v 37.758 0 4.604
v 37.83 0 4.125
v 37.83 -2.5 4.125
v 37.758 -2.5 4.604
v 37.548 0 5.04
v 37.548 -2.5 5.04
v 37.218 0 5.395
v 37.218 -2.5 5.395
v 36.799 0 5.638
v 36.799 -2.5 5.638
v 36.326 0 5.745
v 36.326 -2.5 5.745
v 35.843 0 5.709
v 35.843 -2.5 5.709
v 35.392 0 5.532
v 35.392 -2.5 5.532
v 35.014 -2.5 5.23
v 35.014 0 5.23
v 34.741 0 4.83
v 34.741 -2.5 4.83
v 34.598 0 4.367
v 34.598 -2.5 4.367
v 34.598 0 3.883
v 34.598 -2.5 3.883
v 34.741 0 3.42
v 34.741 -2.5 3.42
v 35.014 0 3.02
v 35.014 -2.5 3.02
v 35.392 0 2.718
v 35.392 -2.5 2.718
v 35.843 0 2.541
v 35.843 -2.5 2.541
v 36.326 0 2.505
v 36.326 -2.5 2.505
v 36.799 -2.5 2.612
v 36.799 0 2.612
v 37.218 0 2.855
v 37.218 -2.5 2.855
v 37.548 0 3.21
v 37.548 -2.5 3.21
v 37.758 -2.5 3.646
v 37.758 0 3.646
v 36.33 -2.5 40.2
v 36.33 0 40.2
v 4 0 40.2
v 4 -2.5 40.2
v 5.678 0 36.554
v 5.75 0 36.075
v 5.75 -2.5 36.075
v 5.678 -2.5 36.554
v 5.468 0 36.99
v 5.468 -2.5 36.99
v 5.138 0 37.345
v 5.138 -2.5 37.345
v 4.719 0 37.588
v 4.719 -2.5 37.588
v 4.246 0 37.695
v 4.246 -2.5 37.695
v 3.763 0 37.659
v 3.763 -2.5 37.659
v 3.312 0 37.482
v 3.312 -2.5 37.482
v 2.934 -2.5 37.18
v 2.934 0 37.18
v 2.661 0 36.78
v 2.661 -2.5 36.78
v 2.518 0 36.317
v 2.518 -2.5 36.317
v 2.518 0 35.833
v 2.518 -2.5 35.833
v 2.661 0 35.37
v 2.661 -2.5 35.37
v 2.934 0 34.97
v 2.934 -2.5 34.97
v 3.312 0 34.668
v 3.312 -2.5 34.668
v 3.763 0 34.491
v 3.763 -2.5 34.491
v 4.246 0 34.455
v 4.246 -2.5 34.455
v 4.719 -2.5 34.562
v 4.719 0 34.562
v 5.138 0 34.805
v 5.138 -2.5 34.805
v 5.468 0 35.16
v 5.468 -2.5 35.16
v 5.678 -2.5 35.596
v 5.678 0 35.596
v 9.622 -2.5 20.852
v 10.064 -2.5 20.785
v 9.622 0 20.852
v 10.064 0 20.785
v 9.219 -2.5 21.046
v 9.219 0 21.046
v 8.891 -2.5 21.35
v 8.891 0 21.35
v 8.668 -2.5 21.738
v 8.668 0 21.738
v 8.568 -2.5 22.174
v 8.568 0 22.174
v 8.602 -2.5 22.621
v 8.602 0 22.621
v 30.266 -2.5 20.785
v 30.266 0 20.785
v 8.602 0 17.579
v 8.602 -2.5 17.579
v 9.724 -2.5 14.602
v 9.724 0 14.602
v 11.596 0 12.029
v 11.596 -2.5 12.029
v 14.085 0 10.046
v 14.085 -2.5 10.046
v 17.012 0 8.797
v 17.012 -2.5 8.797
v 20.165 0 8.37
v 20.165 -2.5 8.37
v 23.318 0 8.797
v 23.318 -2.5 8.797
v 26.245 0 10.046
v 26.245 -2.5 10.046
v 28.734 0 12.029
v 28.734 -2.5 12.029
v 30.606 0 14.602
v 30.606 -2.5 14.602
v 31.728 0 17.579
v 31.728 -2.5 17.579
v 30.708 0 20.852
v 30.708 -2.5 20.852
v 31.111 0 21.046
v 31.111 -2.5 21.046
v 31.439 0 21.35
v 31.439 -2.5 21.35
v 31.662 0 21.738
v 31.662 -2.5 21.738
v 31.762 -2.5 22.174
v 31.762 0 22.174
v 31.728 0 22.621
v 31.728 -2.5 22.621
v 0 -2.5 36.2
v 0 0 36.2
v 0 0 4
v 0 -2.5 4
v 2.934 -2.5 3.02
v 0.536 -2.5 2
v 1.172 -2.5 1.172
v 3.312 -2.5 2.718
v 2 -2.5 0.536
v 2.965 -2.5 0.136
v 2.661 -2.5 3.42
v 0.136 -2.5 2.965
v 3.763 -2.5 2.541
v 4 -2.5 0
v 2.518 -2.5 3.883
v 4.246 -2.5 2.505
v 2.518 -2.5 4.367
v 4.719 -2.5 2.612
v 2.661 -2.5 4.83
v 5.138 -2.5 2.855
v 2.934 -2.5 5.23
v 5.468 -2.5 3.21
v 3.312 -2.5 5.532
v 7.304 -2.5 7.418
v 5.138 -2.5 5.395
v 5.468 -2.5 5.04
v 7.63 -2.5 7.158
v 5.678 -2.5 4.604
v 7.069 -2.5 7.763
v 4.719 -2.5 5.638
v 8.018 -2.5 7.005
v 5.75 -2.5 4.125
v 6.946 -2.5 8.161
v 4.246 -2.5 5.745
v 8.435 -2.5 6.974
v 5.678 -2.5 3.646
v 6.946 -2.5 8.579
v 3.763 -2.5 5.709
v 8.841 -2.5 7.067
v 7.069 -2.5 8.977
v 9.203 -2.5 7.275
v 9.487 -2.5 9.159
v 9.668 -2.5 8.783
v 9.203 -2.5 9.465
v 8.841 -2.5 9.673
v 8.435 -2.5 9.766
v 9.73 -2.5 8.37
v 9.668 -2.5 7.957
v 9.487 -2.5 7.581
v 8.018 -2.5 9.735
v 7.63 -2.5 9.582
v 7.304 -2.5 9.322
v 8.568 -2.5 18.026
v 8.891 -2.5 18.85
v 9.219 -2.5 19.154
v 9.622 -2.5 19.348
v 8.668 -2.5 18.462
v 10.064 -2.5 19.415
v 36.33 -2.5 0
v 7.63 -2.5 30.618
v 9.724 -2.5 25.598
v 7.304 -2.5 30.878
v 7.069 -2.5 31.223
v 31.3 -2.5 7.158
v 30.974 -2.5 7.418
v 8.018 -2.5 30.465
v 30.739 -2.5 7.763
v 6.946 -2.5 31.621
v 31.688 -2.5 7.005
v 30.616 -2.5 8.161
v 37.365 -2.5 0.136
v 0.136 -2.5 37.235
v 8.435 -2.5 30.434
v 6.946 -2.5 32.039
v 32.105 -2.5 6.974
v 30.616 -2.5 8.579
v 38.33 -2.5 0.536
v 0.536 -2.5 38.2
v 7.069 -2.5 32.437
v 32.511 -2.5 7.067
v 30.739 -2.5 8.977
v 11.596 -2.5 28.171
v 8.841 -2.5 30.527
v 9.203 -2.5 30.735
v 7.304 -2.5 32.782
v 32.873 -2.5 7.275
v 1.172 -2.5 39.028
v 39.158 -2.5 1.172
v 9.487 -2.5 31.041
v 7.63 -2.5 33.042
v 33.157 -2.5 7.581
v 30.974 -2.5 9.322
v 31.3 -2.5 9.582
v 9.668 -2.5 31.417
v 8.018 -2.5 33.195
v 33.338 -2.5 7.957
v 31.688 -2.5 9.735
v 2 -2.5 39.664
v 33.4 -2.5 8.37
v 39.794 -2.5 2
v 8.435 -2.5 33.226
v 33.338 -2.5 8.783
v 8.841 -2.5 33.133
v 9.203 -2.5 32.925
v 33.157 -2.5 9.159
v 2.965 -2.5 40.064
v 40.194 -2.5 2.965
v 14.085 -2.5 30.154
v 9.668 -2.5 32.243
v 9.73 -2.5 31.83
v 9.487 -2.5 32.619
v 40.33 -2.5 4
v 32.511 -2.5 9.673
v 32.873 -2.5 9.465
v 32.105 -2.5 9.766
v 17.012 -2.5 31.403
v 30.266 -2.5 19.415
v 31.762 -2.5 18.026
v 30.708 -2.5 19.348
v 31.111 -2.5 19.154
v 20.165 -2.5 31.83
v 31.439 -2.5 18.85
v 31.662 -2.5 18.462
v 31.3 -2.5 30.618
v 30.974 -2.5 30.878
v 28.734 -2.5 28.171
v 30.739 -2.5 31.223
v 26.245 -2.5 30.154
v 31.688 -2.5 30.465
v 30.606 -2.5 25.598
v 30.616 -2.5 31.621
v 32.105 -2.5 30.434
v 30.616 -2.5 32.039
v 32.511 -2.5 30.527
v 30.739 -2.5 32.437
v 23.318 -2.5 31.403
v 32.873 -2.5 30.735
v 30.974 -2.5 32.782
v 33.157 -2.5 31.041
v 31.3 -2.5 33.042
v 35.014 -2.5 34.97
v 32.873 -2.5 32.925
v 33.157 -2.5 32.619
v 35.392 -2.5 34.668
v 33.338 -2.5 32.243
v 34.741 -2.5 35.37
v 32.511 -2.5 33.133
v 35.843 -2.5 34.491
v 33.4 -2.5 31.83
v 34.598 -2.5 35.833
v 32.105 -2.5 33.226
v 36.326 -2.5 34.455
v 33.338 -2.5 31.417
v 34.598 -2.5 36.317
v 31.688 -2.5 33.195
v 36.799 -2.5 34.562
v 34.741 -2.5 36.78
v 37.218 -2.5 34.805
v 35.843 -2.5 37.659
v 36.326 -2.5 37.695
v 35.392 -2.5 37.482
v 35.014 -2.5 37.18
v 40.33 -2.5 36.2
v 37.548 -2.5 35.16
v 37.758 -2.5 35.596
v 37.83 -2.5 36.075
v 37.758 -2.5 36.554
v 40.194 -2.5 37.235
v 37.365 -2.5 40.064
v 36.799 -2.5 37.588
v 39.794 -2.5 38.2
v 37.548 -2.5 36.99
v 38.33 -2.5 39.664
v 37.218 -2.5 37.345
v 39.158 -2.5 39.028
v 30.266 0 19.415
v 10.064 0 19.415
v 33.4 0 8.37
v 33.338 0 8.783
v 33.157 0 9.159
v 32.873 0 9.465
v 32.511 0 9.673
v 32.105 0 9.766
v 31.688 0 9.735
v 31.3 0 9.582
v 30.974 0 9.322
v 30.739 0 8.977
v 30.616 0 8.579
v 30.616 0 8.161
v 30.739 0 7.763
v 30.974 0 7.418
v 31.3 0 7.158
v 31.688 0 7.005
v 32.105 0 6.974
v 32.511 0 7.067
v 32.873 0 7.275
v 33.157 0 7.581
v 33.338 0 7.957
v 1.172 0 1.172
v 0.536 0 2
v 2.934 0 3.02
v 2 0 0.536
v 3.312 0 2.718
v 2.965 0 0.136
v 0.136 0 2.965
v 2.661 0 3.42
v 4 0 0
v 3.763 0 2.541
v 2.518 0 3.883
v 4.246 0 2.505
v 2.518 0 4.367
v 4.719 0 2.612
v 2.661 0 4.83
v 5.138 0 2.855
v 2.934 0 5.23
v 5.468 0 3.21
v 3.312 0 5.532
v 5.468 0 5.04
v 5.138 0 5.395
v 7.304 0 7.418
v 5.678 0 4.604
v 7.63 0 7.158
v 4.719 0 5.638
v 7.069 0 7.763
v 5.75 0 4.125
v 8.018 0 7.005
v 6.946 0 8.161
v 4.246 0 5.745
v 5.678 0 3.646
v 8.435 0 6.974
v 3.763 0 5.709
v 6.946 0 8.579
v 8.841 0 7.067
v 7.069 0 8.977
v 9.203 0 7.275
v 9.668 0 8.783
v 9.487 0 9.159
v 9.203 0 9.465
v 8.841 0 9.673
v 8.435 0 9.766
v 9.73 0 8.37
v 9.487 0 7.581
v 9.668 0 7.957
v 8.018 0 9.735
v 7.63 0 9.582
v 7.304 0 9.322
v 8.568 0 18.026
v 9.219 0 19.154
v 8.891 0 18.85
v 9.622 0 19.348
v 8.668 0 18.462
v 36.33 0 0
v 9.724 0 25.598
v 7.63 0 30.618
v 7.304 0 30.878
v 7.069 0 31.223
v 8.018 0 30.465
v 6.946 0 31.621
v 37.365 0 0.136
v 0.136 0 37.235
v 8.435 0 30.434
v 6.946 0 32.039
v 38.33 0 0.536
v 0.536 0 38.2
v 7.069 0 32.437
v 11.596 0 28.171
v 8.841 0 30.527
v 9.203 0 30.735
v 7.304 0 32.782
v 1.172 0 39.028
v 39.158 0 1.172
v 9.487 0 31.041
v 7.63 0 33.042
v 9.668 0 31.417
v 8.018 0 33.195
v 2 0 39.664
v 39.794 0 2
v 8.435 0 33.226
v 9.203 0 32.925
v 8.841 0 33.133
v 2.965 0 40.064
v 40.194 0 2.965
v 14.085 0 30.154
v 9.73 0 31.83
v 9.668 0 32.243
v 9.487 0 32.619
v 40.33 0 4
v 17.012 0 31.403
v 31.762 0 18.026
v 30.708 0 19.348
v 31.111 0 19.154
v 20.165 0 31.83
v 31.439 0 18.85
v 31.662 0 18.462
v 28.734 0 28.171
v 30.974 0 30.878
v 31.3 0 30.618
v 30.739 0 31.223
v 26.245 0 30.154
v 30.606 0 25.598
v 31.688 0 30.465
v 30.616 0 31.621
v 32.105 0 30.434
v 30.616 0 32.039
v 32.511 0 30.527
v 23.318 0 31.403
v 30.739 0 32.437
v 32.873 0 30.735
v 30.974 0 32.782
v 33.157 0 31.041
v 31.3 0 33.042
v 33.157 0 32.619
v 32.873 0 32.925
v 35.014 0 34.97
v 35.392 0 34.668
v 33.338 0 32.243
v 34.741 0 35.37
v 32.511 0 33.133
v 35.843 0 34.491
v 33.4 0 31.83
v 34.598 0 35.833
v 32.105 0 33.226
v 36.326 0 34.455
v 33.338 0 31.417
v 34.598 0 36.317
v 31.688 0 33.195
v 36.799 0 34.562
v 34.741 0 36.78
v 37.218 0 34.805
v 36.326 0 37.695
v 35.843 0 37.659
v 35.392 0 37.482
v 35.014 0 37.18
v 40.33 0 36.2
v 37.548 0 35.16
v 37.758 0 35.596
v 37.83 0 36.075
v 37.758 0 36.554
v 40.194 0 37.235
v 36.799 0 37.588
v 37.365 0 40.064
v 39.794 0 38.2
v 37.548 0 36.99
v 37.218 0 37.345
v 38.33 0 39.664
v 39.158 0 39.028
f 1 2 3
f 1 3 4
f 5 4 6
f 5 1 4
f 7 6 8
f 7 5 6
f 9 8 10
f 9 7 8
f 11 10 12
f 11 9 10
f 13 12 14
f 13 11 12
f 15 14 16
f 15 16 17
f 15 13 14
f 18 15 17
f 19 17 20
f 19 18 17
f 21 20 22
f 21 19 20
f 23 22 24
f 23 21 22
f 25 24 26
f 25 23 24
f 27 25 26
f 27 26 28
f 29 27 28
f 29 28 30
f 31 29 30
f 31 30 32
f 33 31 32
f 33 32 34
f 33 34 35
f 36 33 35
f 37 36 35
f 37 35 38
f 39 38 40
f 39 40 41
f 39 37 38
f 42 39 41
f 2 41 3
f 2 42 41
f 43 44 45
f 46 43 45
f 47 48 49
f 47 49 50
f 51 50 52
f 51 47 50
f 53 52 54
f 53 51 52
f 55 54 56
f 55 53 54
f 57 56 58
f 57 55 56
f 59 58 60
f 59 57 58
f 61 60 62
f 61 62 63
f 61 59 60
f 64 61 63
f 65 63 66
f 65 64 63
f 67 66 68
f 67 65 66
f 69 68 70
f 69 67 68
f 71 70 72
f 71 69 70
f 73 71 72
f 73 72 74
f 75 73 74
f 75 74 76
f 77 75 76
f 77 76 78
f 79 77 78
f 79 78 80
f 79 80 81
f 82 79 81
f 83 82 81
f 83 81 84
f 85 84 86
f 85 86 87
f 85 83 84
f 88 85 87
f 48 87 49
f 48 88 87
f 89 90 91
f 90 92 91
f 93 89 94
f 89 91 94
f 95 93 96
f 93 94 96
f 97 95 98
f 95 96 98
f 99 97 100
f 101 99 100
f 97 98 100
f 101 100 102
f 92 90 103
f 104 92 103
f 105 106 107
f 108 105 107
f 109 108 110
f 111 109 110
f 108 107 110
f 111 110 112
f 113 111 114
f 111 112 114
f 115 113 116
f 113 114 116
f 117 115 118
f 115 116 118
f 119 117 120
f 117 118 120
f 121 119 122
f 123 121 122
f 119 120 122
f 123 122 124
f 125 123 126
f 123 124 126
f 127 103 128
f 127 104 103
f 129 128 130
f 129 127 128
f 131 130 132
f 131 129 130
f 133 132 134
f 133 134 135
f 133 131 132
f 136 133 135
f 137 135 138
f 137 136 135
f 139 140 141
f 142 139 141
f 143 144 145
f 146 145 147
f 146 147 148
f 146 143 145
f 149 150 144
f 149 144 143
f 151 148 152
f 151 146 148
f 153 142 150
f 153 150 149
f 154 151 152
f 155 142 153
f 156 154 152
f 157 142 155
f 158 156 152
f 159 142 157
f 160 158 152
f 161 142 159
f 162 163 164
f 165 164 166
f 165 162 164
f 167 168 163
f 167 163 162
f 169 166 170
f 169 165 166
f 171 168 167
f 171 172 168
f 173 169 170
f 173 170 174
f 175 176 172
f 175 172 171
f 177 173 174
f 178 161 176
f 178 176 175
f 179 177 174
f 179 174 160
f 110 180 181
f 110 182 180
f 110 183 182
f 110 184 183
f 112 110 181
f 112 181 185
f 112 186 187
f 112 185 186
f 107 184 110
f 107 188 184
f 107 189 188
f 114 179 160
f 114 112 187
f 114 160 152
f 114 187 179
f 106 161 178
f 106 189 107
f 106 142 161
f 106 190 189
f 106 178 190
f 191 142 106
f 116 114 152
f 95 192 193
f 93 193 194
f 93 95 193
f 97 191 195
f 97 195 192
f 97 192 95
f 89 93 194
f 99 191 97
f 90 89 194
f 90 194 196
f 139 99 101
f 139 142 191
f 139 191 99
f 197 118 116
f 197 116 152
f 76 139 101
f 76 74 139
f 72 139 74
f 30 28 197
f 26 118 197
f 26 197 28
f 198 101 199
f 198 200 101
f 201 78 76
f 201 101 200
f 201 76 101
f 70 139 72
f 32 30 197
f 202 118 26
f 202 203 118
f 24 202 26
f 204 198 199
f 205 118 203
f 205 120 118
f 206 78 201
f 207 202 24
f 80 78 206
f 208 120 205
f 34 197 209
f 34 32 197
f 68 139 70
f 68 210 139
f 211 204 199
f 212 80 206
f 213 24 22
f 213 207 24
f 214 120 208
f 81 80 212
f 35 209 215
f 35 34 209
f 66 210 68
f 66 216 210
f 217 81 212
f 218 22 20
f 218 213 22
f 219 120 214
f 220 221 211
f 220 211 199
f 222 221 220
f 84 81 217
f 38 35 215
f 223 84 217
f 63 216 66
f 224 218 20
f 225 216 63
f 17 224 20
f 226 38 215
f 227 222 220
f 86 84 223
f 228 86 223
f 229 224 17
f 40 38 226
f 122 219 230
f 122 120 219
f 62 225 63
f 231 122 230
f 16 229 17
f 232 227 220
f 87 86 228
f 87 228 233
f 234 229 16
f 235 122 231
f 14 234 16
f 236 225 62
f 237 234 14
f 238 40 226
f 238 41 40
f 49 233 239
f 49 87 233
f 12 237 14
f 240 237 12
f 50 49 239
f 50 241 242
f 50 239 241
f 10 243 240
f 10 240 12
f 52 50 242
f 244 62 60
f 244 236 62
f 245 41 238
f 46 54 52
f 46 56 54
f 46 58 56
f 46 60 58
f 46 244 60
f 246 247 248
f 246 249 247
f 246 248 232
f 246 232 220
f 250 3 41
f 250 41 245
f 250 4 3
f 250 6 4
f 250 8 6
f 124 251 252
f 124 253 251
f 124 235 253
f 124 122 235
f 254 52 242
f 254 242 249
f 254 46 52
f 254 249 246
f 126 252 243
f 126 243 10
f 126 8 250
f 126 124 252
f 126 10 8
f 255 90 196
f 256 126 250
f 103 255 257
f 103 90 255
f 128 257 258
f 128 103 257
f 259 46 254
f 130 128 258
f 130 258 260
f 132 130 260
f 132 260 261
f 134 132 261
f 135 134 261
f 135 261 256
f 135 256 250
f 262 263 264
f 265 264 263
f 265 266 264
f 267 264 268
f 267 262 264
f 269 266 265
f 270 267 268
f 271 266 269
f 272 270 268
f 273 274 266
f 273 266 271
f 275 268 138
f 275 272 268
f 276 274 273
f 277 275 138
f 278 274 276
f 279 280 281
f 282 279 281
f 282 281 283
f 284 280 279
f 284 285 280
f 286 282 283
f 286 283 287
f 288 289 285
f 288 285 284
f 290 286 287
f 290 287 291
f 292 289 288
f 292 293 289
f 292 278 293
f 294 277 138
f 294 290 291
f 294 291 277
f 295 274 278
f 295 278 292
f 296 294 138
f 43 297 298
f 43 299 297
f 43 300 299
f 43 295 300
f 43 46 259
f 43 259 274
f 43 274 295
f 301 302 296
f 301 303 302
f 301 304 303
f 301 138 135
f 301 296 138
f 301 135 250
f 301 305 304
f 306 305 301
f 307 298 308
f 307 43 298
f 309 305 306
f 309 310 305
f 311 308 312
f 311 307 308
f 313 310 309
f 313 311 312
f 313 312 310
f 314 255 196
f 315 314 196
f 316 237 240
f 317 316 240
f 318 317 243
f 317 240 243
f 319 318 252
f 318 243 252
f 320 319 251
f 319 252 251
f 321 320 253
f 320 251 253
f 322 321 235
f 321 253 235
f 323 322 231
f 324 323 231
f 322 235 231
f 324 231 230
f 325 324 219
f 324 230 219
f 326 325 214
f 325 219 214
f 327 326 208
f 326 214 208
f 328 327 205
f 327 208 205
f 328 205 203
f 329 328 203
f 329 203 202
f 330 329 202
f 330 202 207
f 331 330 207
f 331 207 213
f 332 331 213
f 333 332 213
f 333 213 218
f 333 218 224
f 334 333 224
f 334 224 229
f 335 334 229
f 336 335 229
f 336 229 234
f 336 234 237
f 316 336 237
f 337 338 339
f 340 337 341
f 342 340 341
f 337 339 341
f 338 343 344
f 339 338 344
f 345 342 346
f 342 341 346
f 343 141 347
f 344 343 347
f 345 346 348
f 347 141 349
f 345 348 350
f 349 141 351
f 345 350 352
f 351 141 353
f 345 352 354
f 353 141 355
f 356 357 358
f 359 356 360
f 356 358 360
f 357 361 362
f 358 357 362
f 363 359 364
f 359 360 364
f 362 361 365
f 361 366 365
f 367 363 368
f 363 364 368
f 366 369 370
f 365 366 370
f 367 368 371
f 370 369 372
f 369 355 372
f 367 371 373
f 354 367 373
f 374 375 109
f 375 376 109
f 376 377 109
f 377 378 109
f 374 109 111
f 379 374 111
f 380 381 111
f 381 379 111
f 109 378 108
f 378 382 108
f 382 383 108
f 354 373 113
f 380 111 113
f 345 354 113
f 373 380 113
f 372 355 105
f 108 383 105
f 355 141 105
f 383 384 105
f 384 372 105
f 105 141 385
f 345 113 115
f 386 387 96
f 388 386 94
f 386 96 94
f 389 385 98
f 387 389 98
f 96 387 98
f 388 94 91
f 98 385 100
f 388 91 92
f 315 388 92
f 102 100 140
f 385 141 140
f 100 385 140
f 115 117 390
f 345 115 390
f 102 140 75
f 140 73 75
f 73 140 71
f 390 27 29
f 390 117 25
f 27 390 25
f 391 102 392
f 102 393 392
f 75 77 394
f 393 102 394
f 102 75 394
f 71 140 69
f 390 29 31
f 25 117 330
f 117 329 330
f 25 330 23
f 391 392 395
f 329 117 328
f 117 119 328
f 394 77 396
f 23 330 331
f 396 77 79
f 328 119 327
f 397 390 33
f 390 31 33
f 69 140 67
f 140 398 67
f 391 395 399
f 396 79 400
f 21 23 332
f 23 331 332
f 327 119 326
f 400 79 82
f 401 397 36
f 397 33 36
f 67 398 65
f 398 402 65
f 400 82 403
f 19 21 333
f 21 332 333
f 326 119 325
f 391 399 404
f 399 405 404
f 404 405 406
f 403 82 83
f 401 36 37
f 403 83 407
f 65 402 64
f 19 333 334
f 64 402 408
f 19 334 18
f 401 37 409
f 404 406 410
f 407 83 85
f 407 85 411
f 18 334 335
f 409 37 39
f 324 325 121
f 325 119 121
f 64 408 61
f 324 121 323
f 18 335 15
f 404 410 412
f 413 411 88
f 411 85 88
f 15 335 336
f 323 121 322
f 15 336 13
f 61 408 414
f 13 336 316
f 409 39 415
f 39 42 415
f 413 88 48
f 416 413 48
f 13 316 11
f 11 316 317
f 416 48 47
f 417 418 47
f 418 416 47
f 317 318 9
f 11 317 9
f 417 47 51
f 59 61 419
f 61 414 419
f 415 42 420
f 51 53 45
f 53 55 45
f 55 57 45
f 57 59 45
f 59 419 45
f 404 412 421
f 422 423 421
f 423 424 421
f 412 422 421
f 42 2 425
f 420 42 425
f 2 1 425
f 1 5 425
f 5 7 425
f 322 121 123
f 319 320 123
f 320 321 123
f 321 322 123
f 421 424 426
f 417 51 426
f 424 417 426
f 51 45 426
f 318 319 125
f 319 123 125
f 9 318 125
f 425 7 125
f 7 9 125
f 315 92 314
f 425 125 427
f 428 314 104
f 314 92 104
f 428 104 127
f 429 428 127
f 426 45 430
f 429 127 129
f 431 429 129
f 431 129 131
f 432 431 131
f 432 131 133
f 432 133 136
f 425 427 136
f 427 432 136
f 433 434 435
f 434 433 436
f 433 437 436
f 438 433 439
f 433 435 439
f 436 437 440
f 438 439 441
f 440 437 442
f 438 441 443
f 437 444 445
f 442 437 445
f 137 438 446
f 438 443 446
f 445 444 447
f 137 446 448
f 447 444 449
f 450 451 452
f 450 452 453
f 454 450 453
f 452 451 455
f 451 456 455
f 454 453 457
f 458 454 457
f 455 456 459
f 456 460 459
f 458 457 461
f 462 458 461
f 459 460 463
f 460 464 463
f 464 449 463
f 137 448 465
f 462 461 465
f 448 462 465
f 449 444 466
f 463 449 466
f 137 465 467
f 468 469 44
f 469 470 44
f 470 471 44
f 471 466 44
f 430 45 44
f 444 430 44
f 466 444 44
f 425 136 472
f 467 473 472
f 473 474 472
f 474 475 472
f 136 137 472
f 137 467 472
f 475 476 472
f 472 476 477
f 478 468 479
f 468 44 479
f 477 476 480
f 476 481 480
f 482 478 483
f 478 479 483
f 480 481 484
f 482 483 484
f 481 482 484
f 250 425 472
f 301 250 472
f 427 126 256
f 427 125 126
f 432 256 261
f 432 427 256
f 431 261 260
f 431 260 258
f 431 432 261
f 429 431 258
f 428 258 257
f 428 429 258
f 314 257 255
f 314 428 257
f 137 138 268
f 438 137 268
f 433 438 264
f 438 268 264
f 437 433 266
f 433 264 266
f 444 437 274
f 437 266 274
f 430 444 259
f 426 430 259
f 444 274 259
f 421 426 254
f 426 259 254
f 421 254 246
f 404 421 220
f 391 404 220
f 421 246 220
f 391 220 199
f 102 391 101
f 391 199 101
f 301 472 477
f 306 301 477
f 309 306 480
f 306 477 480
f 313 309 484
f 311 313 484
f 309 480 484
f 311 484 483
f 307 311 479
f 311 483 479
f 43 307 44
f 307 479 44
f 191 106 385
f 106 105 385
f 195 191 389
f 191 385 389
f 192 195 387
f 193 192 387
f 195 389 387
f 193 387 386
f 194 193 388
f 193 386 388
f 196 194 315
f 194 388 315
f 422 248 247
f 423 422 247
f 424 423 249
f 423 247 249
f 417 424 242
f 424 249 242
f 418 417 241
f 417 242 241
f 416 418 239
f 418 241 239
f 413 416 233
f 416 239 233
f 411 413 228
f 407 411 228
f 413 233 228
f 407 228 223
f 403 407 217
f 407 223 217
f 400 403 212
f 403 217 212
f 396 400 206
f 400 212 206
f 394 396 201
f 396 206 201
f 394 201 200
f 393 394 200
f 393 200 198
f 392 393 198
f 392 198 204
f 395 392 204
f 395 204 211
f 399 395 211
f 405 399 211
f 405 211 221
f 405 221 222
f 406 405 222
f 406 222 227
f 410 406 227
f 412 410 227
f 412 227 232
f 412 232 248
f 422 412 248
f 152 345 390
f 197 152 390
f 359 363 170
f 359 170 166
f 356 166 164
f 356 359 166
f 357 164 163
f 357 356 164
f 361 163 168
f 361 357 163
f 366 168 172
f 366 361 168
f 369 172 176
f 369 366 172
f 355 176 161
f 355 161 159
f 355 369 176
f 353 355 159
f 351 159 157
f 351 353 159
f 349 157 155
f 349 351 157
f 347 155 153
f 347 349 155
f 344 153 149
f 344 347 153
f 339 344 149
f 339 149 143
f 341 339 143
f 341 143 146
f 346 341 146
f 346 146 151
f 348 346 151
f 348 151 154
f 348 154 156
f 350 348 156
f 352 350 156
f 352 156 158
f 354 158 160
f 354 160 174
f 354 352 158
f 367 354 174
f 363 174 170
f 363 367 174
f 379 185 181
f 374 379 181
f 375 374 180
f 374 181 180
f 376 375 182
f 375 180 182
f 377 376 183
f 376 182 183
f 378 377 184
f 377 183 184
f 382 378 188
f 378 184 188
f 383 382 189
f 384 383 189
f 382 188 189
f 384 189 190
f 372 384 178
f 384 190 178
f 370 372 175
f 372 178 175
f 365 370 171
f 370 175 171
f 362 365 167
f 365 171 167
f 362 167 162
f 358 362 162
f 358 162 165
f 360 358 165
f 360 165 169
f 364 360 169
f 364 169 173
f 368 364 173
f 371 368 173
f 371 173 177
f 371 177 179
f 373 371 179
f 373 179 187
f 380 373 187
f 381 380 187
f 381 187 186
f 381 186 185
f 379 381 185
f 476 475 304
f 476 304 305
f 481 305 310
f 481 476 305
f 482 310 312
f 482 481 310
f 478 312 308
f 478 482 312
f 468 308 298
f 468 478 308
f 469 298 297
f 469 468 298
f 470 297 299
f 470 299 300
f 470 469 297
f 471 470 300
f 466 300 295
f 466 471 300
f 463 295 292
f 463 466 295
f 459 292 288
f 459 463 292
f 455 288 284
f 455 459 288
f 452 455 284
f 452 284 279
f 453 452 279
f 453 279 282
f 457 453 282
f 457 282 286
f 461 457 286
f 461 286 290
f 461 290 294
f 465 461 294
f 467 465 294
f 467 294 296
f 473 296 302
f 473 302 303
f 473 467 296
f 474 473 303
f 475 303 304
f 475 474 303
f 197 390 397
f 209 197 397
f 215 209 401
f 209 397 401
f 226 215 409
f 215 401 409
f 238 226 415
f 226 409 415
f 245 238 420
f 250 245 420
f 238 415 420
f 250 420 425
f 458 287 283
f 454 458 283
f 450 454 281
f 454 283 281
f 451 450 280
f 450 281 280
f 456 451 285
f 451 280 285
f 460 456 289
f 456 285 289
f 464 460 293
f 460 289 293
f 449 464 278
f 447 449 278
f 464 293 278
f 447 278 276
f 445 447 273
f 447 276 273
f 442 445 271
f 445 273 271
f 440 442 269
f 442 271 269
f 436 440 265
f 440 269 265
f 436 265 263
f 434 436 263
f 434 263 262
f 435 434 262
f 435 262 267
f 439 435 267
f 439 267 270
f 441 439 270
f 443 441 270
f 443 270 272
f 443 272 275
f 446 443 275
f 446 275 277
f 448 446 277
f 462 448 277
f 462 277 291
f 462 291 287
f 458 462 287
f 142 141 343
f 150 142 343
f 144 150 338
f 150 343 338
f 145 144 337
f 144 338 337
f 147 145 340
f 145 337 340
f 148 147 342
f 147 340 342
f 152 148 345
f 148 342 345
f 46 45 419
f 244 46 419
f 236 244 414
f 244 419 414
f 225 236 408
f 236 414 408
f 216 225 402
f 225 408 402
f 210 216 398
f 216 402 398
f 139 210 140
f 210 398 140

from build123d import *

# Parameters (mm, degrees)
F0_R     = 1.625
F1_DEPTH = 2.5
F2_R     = 1.4
F3_DEPTH = 2.501
F4_R     = 1.5


with BuildPart() as f1:
    # F0 (on Front) → F1 (new body)
    with BuildSketch(Plane.XZ):
        with BuildLine():
            ThreePointArc((0, 4), (1.171573, 1.171573), (4, 0))
            Line((4, 0), (36.33, 0))
            ThreePointArc((36.33, 0), (39.158427, 1.171573), (40.33, 4))
            Line((40.33, 4), (40.33, 36.2))
            ThreePointArc((40.33, 36.2), (39.158427, 39.028427), (36.33, 40.2))
            Line((36.33, 40.2), (4, 40.2))
            ThreePointArc((4, 40.2), (1.171573, 39.028427), (0, 36.2))
            Line((0, 36.2), (0, 4))
        make_face()
        with Locations((4.125, 4.125)):
            Circle(F0_R, mode=Mode.SUBTRACT)
        with Locations((36.205, 4.125)):
            Circle(F0_R, mode=Mode.SUBTRACT)
        with Locations((4.125, 36.075)):
            Circle(F0_R, mode=Mode.SUBTRACT)
        with Locations((36.205, 36.075)):
            Circle(F0_R, mode=Mode.SUBTRACT)
    extrude(amount=F1_DEPTH)

    # F2 (on face) → F3 (cut, through all)
    with BuildSketch(Plane.XZ.offset(2.5)):
        with Locations((8.33, 31.83)):
            Circle(F2_R)
        with Locations((32, 31.83)):
            Circle(F2_R)
        with Locations((32, 8.37)):
            Circle(F2_R)
        with Locations((8.33, 8.37)):
            Circle(F2_R)
        with BuildLine():
            ThreePointArc((8.33, 19.415), (20.165, 8.37), (32, 19.415))
            Line((32, 19.415), (8.33, 19.415))
        make_face()
        with BuildLine():
            Line((8.33, 20.785), (32, 20.785))
            ThreePointArc((32, 20.785), (20.165, 31.83), (8.33, 20.785))
        make_face()
    extrude(amount=-F3_DEPTH, mode=Mode.SUBTRACT)

    # F4
    f4_edges = [f1.edges().sort_by_distance(p)[0] for p in [
        (8.33, -1.25, 20.785),
        (32, -1.25, 20.785),
        (32, -1.25, 19.415),
        (8.33, -1.25, 19.415),
    ]]
    fillet(f4_edges, radius=F4_R)


solid = f1.part
